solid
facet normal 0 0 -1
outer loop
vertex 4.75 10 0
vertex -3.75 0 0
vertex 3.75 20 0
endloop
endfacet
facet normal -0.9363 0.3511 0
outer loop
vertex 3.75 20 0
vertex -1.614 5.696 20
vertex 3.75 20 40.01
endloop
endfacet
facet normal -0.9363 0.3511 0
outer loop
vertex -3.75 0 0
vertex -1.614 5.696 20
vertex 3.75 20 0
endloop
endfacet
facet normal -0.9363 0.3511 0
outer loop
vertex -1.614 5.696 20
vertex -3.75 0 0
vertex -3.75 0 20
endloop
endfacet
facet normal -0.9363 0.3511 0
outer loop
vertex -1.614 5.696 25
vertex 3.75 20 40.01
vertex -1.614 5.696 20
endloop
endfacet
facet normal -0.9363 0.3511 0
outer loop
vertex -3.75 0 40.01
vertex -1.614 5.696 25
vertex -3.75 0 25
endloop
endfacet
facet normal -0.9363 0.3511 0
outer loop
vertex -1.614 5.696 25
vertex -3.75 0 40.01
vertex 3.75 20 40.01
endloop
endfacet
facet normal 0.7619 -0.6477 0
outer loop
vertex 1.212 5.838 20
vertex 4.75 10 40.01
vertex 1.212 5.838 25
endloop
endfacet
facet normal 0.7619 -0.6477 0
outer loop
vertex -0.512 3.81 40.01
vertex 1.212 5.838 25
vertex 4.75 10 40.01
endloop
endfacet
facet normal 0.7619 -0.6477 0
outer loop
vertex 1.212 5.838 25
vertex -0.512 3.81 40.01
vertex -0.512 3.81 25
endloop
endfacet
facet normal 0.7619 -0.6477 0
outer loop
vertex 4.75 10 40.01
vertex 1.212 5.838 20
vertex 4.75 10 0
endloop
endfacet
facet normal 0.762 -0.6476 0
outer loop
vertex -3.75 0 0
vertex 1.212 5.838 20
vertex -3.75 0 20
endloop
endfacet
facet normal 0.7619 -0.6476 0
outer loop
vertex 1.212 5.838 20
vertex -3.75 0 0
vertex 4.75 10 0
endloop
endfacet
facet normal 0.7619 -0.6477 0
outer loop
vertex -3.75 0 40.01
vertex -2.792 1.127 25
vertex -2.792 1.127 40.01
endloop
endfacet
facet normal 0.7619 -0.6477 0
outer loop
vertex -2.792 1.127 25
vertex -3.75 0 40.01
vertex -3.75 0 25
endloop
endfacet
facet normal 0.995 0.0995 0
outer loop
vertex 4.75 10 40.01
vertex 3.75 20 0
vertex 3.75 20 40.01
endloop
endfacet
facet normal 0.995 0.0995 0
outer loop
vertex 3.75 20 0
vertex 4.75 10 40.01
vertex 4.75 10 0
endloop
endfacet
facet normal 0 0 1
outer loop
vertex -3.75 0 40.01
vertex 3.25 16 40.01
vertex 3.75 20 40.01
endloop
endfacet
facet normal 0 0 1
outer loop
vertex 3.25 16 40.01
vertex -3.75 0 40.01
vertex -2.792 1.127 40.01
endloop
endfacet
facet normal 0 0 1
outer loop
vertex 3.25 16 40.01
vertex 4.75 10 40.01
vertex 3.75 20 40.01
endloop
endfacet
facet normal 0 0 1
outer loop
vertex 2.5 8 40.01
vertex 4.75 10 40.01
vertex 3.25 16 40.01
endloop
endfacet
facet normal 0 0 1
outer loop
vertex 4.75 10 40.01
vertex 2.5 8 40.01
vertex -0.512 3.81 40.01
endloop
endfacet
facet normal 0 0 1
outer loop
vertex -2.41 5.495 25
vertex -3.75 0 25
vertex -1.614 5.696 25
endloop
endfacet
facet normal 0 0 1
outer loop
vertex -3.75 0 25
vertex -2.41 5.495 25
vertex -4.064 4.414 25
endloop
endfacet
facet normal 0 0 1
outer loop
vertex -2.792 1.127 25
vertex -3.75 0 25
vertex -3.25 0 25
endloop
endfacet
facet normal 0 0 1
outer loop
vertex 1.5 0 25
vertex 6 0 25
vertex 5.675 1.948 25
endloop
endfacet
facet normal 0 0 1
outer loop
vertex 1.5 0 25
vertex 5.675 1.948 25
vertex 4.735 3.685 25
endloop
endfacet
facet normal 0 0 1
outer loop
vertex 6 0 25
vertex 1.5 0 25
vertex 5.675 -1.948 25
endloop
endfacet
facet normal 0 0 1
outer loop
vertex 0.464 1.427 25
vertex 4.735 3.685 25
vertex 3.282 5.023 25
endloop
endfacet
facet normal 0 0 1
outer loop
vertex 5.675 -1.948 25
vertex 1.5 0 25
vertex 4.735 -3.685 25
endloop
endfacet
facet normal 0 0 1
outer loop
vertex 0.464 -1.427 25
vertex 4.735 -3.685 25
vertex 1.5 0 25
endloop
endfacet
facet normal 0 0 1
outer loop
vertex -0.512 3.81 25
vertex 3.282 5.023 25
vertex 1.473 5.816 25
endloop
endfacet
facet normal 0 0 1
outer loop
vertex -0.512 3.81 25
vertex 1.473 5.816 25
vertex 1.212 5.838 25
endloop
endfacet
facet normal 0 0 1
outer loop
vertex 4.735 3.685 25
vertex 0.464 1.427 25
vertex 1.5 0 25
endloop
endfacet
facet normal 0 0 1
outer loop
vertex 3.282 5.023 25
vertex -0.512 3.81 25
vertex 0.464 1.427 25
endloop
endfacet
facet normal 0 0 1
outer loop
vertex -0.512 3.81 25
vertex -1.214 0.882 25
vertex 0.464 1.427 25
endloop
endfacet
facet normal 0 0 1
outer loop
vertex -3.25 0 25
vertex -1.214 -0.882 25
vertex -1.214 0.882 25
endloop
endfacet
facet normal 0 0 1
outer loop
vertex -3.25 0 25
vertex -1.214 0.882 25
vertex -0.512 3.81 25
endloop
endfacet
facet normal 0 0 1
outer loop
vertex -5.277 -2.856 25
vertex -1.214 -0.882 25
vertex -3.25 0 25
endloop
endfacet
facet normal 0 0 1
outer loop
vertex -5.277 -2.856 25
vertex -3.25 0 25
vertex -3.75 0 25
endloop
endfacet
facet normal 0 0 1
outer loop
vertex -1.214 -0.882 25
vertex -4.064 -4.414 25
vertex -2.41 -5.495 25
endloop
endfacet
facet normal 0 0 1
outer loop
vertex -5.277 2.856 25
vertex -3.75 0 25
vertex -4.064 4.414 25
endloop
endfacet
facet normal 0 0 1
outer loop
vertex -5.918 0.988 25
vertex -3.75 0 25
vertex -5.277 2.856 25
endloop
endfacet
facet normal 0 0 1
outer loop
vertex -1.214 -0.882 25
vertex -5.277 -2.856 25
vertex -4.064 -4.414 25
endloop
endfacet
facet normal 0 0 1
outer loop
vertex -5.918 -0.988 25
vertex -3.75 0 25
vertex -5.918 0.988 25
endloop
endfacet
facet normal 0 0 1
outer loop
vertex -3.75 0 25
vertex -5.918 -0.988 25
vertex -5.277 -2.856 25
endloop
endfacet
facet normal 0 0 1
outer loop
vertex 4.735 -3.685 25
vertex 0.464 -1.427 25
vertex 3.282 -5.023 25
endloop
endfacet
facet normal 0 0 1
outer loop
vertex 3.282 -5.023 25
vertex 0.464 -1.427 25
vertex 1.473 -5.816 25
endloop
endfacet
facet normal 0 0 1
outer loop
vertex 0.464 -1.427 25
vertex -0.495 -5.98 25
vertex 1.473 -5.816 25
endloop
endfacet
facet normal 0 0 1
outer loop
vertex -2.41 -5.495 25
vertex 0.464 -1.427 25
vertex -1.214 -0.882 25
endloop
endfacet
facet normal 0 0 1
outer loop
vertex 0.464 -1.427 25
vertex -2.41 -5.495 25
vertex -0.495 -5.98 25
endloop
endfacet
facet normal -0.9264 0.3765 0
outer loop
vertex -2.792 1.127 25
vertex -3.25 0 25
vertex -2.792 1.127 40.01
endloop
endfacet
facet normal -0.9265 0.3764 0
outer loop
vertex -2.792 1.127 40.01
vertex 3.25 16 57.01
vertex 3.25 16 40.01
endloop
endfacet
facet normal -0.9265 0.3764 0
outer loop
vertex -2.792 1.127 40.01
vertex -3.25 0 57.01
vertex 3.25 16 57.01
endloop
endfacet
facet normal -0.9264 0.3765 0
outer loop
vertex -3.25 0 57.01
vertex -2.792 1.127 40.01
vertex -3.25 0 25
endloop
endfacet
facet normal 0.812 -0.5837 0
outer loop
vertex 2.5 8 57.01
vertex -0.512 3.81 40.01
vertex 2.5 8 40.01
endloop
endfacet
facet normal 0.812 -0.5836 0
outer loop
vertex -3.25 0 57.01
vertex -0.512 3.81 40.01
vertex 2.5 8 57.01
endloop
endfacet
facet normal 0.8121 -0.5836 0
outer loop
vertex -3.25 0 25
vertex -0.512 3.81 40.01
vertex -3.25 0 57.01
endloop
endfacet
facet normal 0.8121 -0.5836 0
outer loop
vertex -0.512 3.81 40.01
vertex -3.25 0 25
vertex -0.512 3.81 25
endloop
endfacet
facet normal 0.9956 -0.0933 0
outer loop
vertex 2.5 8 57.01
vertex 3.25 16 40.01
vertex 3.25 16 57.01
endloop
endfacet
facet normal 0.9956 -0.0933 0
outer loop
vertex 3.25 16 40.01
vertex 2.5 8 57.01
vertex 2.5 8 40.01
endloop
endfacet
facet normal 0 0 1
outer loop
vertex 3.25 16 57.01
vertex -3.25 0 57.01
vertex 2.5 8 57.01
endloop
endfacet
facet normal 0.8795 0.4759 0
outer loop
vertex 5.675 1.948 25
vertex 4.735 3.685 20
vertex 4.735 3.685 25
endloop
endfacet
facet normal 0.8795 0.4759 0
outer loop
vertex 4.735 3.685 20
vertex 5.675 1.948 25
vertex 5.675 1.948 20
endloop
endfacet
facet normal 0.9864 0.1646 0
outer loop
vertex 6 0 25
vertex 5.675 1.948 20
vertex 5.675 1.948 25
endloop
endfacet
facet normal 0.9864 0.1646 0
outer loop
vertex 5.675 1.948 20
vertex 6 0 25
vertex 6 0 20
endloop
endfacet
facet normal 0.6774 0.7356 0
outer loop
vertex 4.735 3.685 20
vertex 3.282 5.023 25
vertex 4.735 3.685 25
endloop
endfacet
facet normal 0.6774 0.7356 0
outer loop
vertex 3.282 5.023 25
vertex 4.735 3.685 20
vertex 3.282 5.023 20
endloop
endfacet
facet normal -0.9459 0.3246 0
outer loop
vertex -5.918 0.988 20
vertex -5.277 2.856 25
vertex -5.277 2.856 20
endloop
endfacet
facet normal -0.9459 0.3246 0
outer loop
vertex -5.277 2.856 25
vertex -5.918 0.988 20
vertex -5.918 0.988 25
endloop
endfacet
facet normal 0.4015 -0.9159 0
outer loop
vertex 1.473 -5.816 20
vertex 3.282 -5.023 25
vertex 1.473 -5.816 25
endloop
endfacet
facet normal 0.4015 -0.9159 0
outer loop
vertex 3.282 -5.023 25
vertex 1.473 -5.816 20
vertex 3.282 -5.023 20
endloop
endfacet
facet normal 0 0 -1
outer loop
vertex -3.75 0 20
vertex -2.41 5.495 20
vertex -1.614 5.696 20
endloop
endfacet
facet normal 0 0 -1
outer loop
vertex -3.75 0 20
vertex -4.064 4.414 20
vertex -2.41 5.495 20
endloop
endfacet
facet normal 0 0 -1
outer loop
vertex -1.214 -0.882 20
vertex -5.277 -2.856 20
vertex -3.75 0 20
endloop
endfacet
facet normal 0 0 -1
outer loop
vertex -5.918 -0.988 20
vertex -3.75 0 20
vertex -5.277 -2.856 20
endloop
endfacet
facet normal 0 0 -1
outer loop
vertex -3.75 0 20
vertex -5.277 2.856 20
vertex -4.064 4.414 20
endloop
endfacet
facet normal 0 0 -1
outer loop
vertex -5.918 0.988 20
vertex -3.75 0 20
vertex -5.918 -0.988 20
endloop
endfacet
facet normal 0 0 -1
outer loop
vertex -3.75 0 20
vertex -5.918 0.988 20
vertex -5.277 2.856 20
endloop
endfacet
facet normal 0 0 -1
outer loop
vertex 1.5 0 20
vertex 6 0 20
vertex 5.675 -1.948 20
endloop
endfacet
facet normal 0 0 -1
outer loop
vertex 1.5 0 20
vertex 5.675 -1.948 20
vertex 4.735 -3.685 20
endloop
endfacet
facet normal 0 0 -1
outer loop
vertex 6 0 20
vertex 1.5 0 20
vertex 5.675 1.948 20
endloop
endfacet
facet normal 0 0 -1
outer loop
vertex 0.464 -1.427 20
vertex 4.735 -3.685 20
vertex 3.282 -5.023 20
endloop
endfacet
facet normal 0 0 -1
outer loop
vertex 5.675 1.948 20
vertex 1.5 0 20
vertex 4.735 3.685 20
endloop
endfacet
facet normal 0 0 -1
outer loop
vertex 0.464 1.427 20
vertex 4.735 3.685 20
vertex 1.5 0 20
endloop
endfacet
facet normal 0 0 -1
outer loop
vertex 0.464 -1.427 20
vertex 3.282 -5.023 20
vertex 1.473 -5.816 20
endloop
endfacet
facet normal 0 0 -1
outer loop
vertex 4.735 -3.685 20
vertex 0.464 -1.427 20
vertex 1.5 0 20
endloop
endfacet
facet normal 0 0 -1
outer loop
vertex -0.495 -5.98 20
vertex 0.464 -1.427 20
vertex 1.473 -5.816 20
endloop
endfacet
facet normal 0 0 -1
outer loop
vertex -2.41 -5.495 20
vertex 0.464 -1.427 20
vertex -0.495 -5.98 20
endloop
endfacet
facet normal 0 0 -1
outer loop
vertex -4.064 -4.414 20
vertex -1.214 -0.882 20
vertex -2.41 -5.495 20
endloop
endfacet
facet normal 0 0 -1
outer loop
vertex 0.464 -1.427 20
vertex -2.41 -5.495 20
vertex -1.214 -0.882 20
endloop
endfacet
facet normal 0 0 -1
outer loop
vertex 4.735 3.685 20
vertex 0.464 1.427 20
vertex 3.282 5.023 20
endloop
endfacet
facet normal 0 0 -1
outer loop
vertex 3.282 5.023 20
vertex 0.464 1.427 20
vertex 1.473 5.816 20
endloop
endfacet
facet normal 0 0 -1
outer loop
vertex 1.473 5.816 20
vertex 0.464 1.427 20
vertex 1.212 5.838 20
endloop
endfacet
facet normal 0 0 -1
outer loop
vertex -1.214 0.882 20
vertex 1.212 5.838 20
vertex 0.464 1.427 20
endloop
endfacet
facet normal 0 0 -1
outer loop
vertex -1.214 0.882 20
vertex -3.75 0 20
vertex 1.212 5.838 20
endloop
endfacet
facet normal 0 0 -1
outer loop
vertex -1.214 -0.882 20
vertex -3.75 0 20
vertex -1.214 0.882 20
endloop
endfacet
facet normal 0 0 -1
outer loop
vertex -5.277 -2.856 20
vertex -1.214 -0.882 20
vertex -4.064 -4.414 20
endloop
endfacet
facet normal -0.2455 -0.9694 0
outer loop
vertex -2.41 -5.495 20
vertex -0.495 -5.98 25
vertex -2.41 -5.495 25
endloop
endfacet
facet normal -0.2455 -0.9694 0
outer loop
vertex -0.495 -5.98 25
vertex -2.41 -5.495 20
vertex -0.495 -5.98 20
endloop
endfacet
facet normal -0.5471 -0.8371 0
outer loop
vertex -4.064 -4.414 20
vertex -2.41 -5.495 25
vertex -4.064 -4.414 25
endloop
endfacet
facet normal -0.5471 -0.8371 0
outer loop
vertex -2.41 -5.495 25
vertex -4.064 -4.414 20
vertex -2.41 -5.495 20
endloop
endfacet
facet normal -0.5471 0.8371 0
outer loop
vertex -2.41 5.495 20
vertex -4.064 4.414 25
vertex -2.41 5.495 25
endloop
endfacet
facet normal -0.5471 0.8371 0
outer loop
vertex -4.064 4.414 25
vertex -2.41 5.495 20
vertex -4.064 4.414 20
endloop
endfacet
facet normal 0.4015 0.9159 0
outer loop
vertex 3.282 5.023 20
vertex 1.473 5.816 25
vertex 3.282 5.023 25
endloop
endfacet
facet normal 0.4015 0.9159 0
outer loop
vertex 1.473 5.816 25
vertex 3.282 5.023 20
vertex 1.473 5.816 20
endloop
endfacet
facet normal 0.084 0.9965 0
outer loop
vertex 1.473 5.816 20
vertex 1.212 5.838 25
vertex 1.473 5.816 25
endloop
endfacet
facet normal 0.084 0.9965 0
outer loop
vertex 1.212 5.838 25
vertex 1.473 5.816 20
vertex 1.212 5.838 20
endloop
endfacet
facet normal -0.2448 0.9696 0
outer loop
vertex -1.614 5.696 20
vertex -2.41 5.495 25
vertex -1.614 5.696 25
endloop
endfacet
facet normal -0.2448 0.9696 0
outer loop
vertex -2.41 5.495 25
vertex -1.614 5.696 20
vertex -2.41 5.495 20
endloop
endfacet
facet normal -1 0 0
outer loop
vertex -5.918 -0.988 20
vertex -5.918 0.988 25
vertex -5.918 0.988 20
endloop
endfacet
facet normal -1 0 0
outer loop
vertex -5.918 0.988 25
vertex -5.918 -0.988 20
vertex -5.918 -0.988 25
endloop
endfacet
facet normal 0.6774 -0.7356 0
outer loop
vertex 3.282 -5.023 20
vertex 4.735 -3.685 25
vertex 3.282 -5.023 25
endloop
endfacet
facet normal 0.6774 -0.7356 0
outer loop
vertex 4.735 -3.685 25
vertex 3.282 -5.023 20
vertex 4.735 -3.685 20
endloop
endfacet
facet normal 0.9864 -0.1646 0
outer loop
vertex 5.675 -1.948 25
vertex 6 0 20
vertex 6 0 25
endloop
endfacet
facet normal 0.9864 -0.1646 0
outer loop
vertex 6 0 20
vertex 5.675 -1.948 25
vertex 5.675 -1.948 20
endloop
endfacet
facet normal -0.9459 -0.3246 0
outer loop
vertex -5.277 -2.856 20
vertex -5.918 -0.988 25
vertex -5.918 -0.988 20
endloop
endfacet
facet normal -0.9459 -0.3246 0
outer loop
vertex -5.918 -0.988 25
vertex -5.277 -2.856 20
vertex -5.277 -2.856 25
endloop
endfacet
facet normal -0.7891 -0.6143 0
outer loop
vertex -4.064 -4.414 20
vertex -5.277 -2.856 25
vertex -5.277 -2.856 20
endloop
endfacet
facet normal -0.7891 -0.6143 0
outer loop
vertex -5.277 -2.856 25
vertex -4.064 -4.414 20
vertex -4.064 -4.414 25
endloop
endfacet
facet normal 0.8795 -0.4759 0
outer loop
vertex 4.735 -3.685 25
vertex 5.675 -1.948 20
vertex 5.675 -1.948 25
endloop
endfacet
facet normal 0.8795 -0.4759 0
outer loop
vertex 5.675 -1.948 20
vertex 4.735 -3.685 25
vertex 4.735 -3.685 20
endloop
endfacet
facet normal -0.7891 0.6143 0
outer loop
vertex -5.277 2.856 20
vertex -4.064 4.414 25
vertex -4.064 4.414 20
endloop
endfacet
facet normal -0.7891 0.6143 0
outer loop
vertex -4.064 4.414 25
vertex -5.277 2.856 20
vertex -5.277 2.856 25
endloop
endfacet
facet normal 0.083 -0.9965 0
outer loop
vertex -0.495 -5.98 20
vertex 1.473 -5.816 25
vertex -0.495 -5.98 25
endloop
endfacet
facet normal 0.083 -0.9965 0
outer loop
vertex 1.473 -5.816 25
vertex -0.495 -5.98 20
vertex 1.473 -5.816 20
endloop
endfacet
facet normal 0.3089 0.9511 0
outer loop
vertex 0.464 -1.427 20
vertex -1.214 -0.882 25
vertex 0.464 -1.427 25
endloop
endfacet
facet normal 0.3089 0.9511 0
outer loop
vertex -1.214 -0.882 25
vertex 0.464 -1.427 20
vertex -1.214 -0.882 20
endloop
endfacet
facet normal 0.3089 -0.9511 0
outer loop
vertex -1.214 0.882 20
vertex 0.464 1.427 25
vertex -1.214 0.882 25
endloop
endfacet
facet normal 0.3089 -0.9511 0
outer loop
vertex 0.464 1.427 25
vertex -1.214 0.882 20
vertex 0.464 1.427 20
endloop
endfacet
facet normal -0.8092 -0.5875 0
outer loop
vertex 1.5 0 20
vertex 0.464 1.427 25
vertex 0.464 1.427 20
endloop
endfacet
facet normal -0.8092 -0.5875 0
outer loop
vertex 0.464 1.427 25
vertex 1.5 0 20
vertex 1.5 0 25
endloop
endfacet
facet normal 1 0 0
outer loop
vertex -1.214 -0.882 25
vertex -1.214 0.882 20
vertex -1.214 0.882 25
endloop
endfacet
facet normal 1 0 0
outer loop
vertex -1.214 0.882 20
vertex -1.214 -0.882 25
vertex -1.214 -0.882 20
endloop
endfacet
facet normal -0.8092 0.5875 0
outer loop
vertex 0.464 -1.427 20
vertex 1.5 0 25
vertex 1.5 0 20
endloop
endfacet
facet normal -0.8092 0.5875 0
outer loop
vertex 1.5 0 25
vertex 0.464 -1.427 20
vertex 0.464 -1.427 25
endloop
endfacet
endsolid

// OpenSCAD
// Straight hose-barb reducer: 8 mm tubing (barbs) -> 5 mm tubing (barbs)
// Print orientation: standing upright along Z, centred on origin in X/Y

// ---------------- Parameters ----------------
bore      = 3;    // through-bore diameter (mm)
eps       = 0.5;  // cutter overshoot past faces (mm)

// Lower section (z = 0 .. 20): 8 mm tubing barbs
z_barb_a  = 20;   // height of lower barbs (mm)
d_barb_a  = 7.5;  // outer diameter of lower barbs at bottom (mm)
d_barb_t  = 9.5;  // outer diameter of lower barbs at top (mm)
n_barb_a  = 2;    // number of lower barbs, stacked

// Collar (z = 20 .. 25)
z_collar  = 5;    // collar thickness (mm)
d_collar  = 12;   // collar outer diameter (mm)

// Upper section (z = 25 .. 41): 5 mm tubing barbs
z_barb_b  = 16;   // height of upper barbs (mm)
d_barb_c  = 6.5;  // outer diameter of upper barbs at bottom (mm)
d_barb_d  = 5.0;  // outer diameter of upper barbs at top (mm)
n_barb_b  = 2;    // number of upper barbs, stacked

total_h   = z_barb_a + z_collar + z_barb_b;  // 41 mm overall

// ---------------- Model ----------------
difference() {
    union() {
        // Lower barbs: sawtooth profile, extended above collar for a clean union
        for (i = [0 : n_barb_a - 1])
            translate([0, 0, i * z_barb_a / (n_barb_a - 1)])
                linear_extrude(height = z_barb_a + 0.01)
                    polygon(points = [
                        [-d_barb_a / 2, 0],
                        [ d_barb_t / 2, z_barb_a * 0.5],
                        [ d_barb_a / 2, z_barb_a]
                    ]);

        // Collar
        translate([0, 0, z_barb_a])
            cylinder(h = z_collar, d = d_collar);

        // Upper barbs: sawtooth profile, extended below collar for a clean union
        for (i = [0 : n_barb_b - 1])
            translate([0, 0, z_barb_a + z_collar + i * z_barb_b / (n_barb_b - 1)])
                linear_extrude(height = z_barb_b + 0.01)
                    polygon(points = [
                        [-d_barb_c / 2, 0],
                        [ d_barb_d / 2, z_barb_b * 0.5],
                        [ d_barb_c / 2, z_barb_b]
                    ]);
    }

    // Through-bore
    translate([0, 0, -eps])
        cylinder(h = total_h + 2 * eps, d = bore);
}
